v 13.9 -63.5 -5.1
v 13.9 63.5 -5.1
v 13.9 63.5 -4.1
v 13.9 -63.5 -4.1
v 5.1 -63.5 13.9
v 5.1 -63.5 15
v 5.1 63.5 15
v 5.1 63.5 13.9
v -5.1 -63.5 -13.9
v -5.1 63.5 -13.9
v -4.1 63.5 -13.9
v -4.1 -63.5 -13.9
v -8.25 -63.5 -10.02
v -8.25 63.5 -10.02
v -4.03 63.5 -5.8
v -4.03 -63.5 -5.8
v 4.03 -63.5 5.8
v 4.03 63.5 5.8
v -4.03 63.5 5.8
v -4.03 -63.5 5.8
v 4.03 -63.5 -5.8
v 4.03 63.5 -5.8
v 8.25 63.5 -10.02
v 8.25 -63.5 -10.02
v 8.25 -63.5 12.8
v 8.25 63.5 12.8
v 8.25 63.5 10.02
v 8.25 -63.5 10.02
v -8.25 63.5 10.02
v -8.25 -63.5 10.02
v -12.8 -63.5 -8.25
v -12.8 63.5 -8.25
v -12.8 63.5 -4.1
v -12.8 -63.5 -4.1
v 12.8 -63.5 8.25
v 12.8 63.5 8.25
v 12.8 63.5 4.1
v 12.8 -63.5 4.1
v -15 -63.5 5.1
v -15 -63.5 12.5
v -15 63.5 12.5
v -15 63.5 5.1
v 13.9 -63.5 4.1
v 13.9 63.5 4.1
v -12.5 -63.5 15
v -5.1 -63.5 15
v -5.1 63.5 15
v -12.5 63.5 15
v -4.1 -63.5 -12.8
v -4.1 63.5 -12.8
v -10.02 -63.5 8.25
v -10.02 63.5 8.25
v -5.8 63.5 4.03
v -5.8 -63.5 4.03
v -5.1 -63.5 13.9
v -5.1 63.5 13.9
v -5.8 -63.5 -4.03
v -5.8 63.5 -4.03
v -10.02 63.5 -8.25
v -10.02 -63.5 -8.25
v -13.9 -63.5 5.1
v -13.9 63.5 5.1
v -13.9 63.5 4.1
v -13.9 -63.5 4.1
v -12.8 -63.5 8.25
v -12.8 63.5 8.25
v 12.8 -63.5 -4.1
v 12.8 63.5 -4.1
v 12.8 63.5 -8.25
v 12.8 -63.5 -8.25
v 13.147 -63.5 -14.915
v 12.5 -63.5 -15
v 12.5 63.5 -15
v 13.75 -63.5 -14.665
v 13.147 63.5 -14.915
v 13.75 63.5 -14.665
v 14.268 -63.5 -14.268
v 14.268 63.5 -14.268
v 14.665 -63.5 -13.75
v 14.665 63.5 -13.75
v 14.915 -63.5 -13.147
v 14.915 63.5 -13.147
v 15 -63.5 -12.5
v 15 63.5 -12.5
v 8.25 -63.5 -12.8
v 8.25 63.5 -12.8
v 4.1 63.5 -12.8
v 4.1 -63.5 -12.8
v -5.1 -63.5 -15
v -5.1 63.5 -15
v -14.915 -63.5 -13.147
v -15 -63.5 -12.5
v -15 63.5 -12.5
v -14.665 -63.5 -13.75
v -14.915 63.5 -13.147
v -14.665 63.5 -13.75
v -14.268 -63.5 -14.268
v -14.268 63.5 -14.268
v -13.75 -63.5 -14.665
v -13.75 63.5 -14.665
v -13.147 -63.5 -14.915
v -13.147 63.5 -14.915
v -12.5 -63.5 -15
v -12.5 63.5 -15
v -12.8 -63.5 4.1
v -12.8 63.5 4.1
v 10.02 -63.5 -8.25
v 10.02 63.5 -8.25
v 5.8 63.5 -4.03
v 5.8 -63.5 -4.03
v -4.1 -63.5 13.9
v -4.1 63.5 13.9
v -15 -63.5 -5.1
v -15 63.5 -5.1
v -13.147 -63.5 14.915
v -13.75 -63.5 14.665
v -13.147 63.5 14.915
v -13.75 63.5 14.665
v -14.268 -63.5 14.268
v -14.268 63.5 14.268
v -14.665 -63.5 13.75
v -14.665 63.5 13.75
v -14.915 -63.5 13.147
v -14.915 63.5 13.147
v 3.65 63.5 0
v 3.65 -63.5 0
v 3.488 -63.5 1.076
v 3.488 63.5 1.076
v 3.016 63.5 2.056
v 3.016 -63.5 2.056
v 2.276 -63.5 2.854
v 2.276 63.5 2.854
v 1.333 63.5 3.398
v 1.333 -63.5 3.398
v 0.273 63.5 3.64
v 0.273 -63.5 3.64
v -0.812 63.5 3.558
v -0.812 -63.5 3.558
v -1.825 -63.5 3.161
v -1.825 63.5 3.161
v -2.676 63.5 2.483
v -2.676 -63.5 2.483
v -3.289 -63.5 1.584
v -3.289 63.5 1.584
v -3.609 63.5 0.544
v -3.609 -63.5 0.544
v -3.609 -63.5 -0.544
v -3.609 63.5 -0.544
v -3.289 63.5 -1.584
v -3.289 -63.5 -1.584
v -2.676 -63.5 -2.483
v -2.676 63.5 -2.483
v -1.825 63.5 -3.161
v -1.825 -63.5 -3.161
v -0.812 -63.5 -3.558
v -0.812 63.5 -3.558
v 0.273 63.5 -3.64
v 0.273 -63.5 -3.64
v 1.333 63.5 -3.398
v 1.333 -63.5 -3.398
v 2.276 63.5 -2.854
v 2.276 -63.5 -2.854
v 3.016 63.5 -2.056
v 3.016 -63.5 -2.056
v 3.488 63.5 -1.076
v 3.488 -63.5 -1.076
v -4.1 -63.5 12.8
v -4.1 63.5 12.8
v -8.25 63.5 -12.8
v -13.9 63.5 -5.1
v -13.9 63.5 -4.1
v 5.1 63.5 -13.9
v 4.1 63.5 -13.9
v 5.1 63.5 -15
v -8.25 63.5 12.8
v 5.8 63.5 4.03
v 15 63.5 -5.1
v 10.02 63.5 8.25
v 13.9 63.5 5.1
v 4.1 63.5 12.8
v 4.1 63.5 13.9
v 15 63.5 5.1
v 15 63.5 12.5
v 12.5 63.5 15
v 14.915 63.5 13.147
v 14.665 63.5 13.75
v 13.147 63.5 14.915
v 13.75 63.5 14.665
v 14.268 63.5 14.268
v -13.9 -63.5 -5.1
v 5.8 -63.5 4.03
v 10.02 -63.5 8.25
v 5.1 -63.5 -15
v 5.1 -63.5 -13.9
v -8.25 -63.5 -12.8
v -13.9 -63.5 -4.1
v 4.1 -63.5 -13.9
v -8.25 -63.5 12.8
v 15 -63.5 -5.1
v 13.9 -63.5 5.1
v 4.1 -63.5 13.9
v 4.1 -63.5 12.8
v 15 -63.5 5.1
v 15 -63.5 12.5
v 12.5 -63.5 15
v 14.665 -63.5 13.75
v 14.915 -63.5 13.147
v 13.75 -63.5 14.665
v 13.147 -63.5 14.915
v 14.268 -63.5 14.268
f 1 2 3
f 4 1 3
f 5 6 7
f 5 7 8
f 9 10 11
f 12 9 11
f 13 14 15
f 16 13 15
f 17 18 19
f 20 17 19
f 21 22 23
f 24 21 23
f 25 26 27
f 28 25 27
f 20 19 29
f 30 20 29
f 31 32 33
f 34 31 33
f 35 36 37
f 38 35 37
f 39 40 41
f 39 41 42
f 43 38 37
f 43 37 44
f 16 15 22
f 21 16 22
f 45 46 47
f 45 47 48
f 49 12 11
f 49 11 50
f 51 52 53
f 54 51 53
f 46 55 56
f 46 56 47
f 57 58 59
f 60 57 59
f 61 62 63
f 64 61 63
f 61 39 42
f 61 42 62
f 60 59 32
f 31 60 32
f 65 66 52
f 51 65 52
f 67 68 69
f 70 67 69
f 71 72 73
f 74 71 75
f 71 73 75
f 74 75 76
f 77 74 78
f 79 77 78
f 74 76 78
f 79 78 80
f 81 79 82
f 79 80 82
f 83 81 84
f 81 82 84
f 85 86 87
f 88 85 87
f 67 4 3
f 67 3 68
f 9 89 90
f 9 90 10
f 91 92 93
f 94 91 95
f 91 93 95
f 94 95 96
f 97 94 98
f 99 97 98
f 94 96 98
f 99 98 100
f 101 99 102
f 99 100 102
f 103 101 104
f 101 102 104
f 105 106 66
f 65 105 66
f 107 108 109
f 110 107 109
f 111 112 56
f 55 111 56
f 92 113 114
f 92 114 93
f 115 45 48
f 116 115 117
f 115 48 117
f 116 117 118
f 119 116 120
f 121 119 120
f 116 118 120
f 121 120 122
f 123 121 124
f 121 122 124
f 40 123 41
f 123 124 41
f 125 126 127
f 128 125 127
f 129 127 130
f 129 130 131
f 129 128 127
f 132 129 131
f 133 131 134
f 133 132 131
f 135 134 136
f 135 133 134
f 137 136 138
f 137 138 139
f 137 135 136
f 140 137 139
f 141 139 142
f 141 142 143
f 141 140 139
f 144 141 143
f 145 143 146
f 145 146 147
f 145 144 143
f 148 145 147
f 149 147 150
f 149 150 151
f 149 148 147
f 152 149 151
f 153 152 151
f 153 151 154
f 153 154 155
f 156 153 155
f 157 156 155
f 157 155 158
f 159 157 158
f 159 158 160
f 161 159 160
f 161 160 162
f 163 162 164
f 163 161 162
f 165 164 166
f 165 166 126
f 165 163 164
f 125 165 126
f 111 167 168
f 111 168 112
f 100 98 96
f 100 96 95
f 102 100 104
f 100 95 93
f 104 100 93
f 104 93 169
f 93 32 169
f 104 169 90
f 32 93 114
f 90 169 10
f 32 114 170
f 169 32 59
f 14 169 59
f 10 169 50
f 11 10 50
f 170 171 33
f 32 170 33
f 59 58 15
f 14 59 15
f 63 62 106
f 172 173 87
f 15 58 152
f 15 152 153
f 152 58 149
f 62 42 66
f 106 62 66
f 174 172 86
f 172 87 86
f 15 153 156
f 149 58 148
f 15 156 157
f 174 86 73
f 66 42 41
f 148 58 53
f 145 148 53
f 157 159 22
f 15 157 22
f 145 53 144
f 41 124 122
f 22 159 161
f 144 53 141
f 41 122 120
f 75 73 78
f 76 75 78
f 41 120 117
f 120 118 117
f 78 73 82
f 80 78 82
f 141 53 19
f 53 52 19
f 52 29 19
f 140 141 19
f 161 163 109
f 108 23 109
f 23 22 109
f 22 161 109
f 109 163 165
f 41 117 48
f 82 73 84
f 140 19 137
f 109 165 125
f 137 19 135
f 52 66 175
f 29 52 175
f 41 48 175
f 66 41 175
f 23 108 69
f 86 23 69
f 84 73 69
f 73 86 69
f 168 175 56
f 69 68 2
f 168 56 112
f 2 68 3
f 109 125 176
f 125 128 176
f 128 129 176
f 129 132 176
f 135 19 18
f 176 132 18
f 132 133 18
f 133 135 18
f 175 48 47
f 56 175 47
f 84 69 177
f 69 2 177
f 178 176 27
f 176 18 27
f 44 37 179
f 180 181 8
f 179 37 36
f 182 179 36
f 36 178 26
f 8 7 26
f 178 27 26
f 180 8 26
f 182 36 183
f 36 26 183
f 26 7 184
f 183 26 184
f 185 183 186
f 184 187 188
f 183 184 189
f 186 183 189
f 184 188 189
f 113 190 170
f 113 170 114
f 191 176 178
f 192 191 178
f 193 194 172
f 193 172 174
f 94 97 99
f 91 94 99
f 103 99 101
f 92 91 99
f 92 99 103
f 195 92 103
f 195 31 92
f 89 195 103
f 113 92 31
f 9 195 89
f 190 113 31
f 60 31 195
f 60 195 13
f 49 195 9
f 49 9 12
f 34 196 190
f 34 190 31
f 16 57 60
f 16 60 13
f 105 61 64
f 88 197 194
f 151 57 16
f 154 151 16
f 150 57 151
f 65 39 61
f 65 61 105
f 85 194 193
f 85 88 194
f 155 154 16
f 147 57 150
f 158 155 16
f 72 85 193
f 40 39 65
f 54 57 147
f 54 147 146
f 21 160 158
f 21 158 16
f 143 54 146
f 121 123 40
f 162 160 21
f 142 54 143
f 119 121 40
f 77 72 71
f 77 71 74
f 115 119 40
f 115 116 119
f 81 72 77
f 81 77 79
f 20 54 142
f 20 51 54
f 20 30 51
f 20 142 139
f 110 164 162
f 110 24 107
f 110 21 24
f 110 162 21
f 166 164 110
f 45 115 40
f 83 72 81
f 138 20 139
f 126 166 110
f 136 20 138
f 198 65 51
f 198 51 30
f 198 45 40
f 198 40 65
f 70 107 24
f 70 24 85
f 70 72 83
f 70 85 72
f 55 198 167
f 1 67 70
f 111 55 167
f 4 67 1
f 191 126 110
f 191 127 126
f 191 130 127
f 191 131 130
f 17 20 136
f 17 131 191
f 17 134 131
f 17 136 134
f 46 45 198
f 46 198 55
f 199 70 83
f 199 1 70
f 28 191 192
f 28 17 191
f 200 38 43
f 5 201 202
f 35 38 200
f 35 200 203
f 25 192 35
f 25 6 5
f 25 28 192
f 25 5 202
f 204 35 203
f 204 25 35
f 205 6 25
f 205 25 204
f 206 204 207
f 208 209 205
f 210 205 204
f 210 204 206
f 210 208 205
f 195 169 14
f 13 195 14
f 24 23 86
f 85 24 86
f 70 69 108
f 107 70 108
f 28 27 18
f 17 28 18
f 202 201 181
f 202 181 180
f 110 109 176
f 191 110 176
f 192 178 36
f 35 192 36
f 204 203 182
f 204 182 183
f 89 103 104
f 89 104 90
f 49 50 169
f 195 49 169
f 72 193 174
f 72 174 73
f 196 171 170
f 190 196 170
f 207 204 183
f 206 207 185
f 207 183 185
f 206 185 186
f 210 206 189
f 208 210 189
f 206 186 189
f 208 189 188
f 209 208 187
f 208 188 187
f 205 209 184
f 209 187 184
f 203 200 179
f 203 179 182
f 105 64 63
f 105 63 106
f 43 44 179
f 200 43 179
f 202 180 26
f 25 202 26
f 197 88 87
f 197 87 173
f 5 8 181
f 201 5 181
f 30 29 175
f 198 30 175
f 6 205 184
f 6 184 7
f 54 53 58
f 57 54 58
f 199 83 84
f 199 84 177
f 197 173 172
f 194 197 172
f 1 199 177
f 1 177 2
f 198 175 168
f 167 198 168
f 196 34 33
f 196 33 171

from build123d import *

# Parameters (mm, degrees)
SKETCH13_R                          = 3.65
BOSCHREXROTH_BOSCH_30X30_V2_1_DEPTH = 127


with BuildPart() as part:
    # Sketch13 → Boschrexroth BOSCH_30X30_V2(1) (new body)
    with BuildSketch(Plane.XZ.offset(-63.5)):
        with BuildLine():
            Line((0, 5.8), (-4.03, 5.8))
            Line((-4.03, 5.8), (-8.25, 10.02))
            Line((-8.25, 10.02), (-8.25, 12.8))
            Line((-8.25, 12.8), (-4.1, 12.8))
            Line((-4.1, 12.8), (-4.1, 13.9))
            Line((-4.1, 13.9), (-5.1, 13.9))
            Line((-5.1, 13.9), (-5.1, 15))
            Line((-5.1, 15), (-12.5, 15))
            ThreePointArc((-12.5, 15), (-14.267766953, 14.267766953), (-15, 12.5))
            Line((-15, 12.5), (-15, 5.1))
            Line((-15, 5.1), (-13.9, 5.1))
            Line((-13.9, 5.1), (-13.9, 4.1))
            Line((-13.9, 4.1), (-12.8, 4.1))
            Line((-12.8, 4.1), (-12.8, 8.25))
            Line((-12.8, 8.25), (-10.02, 8.25))
            Line((-10.02, 8.25), (-5.8, 4.03))
            Line((-5.8, 4.03), (-5.8, 0))
            Line((-5.8, 0), (-5.8, -4.03))
            Line((-5.8, -4.03), (-10.02, -8.25))
            Line((-10.02, -8.25), (-12.8, -8.25))
            Line((-12.8, -8.25), (-12.8, -4.1))
            Line((-12.8, -4.1), (-13.9, -4.1))
            Line((-13.9, -4.1), (-13.9, -5.1))
            Line((-13.9, -5.1), (-15, -5.1))
            Line((-15, -5.1), (-15, -12.5))
            ThreePointArc((-15, -12.5), (-14.267766953, -14.267766953), (-12.5, -15))
            Line((-12.5, -15), (-5.1, -15))
            Line((-5.1, -15), (-5.1, -13.9))
            Line((-5.1, -13.9), (-4.1, -13.9))
            Line((-4.1, -13.9), (-4.1, -12.8))
            Line((-4.1, -12.8), (-8.25, -12.8))
            Line((-8.25, -12.8), (-8.25, -10.02))
            Line((-8.25, -10.02), (-4.03, -5.8))
            Line((-4.03, -5.8), (4.03, -5.8))
            Line((4.03, -5.8), (8.25, -10.02))
            Line((8.25, -10.02), (8.25, -12.8))
            Line((8.25, -12.8), (4.1, -12.8))
            Line((4.1, -12.8), (4.1, -13.9))
            Line((4.1, -13.9), (5.1, -13.9))
            Line((5.1, -13.9), (5.1, -15))
            Line((5.1, -15), (12.5, -15))
            ThreePointArc((12.5, -15), (14.267766953, -14.267766953), (15, -12.5))
            Line((15, -12.5), (15, -5.1))
            Line((15, -5.1), (13.9, -5.1))
            Line((13.9, -5.1), (13.9, -4.1))
            Line((13.9, -4.1), (12.8, -4.1))
            Line((12.8, -4.1), (12.8, -8.25))
            Line((12.8, -8.25), (10.02, -8.25))
            Line((10.02, -8.25), (5.8, -4.03))
            Line((5.8, -4.03), (5.8, 0))
            Line((5.8, 0), (5.8, 4.03))
            Line((5.8, 4.03), (10.02, 8.25))
            Line((10.02, 8.25), (12.8, 8.25))
            Line((12.8, 8.25), (12.8, 4.1))
            Line((12.8, 4.1), (13.9, 4.1))
            Line((13.9, 4.1), (13.9, 5.1))
            Line((13.9, 5.1), (15, 5.1))
            Line((15, 5.1), (15, 12.5))
            ThreePointArc((15, 12.5), (14.267766953, 14.267766953), (12.5, 15))
            Line((12.5, 15), (5.1, 15))
            Line((5.1, 15), (5.1, 13.9))
            Line((5.1, 13.9), (4.1, 13.9))
            Line((4.1, 13.9), (4.1, 12.8))
            Line((4.1, 12.8), (8.25, 12.8))
            Line((8.25, 12.8), (8.25, 10.02))
            Line((8.25, 10.02), (4.03, 5.8))
            Line((4.03, 5.8), (0, 5.8))
        make_face()
        Circle(SKETCH13_R, mode=Mode.SUBTRACT)
    extrude(amount=BOSCHREXROTH_BOSCH_30X30_V2_1_DEPTH)


solid = part.part
